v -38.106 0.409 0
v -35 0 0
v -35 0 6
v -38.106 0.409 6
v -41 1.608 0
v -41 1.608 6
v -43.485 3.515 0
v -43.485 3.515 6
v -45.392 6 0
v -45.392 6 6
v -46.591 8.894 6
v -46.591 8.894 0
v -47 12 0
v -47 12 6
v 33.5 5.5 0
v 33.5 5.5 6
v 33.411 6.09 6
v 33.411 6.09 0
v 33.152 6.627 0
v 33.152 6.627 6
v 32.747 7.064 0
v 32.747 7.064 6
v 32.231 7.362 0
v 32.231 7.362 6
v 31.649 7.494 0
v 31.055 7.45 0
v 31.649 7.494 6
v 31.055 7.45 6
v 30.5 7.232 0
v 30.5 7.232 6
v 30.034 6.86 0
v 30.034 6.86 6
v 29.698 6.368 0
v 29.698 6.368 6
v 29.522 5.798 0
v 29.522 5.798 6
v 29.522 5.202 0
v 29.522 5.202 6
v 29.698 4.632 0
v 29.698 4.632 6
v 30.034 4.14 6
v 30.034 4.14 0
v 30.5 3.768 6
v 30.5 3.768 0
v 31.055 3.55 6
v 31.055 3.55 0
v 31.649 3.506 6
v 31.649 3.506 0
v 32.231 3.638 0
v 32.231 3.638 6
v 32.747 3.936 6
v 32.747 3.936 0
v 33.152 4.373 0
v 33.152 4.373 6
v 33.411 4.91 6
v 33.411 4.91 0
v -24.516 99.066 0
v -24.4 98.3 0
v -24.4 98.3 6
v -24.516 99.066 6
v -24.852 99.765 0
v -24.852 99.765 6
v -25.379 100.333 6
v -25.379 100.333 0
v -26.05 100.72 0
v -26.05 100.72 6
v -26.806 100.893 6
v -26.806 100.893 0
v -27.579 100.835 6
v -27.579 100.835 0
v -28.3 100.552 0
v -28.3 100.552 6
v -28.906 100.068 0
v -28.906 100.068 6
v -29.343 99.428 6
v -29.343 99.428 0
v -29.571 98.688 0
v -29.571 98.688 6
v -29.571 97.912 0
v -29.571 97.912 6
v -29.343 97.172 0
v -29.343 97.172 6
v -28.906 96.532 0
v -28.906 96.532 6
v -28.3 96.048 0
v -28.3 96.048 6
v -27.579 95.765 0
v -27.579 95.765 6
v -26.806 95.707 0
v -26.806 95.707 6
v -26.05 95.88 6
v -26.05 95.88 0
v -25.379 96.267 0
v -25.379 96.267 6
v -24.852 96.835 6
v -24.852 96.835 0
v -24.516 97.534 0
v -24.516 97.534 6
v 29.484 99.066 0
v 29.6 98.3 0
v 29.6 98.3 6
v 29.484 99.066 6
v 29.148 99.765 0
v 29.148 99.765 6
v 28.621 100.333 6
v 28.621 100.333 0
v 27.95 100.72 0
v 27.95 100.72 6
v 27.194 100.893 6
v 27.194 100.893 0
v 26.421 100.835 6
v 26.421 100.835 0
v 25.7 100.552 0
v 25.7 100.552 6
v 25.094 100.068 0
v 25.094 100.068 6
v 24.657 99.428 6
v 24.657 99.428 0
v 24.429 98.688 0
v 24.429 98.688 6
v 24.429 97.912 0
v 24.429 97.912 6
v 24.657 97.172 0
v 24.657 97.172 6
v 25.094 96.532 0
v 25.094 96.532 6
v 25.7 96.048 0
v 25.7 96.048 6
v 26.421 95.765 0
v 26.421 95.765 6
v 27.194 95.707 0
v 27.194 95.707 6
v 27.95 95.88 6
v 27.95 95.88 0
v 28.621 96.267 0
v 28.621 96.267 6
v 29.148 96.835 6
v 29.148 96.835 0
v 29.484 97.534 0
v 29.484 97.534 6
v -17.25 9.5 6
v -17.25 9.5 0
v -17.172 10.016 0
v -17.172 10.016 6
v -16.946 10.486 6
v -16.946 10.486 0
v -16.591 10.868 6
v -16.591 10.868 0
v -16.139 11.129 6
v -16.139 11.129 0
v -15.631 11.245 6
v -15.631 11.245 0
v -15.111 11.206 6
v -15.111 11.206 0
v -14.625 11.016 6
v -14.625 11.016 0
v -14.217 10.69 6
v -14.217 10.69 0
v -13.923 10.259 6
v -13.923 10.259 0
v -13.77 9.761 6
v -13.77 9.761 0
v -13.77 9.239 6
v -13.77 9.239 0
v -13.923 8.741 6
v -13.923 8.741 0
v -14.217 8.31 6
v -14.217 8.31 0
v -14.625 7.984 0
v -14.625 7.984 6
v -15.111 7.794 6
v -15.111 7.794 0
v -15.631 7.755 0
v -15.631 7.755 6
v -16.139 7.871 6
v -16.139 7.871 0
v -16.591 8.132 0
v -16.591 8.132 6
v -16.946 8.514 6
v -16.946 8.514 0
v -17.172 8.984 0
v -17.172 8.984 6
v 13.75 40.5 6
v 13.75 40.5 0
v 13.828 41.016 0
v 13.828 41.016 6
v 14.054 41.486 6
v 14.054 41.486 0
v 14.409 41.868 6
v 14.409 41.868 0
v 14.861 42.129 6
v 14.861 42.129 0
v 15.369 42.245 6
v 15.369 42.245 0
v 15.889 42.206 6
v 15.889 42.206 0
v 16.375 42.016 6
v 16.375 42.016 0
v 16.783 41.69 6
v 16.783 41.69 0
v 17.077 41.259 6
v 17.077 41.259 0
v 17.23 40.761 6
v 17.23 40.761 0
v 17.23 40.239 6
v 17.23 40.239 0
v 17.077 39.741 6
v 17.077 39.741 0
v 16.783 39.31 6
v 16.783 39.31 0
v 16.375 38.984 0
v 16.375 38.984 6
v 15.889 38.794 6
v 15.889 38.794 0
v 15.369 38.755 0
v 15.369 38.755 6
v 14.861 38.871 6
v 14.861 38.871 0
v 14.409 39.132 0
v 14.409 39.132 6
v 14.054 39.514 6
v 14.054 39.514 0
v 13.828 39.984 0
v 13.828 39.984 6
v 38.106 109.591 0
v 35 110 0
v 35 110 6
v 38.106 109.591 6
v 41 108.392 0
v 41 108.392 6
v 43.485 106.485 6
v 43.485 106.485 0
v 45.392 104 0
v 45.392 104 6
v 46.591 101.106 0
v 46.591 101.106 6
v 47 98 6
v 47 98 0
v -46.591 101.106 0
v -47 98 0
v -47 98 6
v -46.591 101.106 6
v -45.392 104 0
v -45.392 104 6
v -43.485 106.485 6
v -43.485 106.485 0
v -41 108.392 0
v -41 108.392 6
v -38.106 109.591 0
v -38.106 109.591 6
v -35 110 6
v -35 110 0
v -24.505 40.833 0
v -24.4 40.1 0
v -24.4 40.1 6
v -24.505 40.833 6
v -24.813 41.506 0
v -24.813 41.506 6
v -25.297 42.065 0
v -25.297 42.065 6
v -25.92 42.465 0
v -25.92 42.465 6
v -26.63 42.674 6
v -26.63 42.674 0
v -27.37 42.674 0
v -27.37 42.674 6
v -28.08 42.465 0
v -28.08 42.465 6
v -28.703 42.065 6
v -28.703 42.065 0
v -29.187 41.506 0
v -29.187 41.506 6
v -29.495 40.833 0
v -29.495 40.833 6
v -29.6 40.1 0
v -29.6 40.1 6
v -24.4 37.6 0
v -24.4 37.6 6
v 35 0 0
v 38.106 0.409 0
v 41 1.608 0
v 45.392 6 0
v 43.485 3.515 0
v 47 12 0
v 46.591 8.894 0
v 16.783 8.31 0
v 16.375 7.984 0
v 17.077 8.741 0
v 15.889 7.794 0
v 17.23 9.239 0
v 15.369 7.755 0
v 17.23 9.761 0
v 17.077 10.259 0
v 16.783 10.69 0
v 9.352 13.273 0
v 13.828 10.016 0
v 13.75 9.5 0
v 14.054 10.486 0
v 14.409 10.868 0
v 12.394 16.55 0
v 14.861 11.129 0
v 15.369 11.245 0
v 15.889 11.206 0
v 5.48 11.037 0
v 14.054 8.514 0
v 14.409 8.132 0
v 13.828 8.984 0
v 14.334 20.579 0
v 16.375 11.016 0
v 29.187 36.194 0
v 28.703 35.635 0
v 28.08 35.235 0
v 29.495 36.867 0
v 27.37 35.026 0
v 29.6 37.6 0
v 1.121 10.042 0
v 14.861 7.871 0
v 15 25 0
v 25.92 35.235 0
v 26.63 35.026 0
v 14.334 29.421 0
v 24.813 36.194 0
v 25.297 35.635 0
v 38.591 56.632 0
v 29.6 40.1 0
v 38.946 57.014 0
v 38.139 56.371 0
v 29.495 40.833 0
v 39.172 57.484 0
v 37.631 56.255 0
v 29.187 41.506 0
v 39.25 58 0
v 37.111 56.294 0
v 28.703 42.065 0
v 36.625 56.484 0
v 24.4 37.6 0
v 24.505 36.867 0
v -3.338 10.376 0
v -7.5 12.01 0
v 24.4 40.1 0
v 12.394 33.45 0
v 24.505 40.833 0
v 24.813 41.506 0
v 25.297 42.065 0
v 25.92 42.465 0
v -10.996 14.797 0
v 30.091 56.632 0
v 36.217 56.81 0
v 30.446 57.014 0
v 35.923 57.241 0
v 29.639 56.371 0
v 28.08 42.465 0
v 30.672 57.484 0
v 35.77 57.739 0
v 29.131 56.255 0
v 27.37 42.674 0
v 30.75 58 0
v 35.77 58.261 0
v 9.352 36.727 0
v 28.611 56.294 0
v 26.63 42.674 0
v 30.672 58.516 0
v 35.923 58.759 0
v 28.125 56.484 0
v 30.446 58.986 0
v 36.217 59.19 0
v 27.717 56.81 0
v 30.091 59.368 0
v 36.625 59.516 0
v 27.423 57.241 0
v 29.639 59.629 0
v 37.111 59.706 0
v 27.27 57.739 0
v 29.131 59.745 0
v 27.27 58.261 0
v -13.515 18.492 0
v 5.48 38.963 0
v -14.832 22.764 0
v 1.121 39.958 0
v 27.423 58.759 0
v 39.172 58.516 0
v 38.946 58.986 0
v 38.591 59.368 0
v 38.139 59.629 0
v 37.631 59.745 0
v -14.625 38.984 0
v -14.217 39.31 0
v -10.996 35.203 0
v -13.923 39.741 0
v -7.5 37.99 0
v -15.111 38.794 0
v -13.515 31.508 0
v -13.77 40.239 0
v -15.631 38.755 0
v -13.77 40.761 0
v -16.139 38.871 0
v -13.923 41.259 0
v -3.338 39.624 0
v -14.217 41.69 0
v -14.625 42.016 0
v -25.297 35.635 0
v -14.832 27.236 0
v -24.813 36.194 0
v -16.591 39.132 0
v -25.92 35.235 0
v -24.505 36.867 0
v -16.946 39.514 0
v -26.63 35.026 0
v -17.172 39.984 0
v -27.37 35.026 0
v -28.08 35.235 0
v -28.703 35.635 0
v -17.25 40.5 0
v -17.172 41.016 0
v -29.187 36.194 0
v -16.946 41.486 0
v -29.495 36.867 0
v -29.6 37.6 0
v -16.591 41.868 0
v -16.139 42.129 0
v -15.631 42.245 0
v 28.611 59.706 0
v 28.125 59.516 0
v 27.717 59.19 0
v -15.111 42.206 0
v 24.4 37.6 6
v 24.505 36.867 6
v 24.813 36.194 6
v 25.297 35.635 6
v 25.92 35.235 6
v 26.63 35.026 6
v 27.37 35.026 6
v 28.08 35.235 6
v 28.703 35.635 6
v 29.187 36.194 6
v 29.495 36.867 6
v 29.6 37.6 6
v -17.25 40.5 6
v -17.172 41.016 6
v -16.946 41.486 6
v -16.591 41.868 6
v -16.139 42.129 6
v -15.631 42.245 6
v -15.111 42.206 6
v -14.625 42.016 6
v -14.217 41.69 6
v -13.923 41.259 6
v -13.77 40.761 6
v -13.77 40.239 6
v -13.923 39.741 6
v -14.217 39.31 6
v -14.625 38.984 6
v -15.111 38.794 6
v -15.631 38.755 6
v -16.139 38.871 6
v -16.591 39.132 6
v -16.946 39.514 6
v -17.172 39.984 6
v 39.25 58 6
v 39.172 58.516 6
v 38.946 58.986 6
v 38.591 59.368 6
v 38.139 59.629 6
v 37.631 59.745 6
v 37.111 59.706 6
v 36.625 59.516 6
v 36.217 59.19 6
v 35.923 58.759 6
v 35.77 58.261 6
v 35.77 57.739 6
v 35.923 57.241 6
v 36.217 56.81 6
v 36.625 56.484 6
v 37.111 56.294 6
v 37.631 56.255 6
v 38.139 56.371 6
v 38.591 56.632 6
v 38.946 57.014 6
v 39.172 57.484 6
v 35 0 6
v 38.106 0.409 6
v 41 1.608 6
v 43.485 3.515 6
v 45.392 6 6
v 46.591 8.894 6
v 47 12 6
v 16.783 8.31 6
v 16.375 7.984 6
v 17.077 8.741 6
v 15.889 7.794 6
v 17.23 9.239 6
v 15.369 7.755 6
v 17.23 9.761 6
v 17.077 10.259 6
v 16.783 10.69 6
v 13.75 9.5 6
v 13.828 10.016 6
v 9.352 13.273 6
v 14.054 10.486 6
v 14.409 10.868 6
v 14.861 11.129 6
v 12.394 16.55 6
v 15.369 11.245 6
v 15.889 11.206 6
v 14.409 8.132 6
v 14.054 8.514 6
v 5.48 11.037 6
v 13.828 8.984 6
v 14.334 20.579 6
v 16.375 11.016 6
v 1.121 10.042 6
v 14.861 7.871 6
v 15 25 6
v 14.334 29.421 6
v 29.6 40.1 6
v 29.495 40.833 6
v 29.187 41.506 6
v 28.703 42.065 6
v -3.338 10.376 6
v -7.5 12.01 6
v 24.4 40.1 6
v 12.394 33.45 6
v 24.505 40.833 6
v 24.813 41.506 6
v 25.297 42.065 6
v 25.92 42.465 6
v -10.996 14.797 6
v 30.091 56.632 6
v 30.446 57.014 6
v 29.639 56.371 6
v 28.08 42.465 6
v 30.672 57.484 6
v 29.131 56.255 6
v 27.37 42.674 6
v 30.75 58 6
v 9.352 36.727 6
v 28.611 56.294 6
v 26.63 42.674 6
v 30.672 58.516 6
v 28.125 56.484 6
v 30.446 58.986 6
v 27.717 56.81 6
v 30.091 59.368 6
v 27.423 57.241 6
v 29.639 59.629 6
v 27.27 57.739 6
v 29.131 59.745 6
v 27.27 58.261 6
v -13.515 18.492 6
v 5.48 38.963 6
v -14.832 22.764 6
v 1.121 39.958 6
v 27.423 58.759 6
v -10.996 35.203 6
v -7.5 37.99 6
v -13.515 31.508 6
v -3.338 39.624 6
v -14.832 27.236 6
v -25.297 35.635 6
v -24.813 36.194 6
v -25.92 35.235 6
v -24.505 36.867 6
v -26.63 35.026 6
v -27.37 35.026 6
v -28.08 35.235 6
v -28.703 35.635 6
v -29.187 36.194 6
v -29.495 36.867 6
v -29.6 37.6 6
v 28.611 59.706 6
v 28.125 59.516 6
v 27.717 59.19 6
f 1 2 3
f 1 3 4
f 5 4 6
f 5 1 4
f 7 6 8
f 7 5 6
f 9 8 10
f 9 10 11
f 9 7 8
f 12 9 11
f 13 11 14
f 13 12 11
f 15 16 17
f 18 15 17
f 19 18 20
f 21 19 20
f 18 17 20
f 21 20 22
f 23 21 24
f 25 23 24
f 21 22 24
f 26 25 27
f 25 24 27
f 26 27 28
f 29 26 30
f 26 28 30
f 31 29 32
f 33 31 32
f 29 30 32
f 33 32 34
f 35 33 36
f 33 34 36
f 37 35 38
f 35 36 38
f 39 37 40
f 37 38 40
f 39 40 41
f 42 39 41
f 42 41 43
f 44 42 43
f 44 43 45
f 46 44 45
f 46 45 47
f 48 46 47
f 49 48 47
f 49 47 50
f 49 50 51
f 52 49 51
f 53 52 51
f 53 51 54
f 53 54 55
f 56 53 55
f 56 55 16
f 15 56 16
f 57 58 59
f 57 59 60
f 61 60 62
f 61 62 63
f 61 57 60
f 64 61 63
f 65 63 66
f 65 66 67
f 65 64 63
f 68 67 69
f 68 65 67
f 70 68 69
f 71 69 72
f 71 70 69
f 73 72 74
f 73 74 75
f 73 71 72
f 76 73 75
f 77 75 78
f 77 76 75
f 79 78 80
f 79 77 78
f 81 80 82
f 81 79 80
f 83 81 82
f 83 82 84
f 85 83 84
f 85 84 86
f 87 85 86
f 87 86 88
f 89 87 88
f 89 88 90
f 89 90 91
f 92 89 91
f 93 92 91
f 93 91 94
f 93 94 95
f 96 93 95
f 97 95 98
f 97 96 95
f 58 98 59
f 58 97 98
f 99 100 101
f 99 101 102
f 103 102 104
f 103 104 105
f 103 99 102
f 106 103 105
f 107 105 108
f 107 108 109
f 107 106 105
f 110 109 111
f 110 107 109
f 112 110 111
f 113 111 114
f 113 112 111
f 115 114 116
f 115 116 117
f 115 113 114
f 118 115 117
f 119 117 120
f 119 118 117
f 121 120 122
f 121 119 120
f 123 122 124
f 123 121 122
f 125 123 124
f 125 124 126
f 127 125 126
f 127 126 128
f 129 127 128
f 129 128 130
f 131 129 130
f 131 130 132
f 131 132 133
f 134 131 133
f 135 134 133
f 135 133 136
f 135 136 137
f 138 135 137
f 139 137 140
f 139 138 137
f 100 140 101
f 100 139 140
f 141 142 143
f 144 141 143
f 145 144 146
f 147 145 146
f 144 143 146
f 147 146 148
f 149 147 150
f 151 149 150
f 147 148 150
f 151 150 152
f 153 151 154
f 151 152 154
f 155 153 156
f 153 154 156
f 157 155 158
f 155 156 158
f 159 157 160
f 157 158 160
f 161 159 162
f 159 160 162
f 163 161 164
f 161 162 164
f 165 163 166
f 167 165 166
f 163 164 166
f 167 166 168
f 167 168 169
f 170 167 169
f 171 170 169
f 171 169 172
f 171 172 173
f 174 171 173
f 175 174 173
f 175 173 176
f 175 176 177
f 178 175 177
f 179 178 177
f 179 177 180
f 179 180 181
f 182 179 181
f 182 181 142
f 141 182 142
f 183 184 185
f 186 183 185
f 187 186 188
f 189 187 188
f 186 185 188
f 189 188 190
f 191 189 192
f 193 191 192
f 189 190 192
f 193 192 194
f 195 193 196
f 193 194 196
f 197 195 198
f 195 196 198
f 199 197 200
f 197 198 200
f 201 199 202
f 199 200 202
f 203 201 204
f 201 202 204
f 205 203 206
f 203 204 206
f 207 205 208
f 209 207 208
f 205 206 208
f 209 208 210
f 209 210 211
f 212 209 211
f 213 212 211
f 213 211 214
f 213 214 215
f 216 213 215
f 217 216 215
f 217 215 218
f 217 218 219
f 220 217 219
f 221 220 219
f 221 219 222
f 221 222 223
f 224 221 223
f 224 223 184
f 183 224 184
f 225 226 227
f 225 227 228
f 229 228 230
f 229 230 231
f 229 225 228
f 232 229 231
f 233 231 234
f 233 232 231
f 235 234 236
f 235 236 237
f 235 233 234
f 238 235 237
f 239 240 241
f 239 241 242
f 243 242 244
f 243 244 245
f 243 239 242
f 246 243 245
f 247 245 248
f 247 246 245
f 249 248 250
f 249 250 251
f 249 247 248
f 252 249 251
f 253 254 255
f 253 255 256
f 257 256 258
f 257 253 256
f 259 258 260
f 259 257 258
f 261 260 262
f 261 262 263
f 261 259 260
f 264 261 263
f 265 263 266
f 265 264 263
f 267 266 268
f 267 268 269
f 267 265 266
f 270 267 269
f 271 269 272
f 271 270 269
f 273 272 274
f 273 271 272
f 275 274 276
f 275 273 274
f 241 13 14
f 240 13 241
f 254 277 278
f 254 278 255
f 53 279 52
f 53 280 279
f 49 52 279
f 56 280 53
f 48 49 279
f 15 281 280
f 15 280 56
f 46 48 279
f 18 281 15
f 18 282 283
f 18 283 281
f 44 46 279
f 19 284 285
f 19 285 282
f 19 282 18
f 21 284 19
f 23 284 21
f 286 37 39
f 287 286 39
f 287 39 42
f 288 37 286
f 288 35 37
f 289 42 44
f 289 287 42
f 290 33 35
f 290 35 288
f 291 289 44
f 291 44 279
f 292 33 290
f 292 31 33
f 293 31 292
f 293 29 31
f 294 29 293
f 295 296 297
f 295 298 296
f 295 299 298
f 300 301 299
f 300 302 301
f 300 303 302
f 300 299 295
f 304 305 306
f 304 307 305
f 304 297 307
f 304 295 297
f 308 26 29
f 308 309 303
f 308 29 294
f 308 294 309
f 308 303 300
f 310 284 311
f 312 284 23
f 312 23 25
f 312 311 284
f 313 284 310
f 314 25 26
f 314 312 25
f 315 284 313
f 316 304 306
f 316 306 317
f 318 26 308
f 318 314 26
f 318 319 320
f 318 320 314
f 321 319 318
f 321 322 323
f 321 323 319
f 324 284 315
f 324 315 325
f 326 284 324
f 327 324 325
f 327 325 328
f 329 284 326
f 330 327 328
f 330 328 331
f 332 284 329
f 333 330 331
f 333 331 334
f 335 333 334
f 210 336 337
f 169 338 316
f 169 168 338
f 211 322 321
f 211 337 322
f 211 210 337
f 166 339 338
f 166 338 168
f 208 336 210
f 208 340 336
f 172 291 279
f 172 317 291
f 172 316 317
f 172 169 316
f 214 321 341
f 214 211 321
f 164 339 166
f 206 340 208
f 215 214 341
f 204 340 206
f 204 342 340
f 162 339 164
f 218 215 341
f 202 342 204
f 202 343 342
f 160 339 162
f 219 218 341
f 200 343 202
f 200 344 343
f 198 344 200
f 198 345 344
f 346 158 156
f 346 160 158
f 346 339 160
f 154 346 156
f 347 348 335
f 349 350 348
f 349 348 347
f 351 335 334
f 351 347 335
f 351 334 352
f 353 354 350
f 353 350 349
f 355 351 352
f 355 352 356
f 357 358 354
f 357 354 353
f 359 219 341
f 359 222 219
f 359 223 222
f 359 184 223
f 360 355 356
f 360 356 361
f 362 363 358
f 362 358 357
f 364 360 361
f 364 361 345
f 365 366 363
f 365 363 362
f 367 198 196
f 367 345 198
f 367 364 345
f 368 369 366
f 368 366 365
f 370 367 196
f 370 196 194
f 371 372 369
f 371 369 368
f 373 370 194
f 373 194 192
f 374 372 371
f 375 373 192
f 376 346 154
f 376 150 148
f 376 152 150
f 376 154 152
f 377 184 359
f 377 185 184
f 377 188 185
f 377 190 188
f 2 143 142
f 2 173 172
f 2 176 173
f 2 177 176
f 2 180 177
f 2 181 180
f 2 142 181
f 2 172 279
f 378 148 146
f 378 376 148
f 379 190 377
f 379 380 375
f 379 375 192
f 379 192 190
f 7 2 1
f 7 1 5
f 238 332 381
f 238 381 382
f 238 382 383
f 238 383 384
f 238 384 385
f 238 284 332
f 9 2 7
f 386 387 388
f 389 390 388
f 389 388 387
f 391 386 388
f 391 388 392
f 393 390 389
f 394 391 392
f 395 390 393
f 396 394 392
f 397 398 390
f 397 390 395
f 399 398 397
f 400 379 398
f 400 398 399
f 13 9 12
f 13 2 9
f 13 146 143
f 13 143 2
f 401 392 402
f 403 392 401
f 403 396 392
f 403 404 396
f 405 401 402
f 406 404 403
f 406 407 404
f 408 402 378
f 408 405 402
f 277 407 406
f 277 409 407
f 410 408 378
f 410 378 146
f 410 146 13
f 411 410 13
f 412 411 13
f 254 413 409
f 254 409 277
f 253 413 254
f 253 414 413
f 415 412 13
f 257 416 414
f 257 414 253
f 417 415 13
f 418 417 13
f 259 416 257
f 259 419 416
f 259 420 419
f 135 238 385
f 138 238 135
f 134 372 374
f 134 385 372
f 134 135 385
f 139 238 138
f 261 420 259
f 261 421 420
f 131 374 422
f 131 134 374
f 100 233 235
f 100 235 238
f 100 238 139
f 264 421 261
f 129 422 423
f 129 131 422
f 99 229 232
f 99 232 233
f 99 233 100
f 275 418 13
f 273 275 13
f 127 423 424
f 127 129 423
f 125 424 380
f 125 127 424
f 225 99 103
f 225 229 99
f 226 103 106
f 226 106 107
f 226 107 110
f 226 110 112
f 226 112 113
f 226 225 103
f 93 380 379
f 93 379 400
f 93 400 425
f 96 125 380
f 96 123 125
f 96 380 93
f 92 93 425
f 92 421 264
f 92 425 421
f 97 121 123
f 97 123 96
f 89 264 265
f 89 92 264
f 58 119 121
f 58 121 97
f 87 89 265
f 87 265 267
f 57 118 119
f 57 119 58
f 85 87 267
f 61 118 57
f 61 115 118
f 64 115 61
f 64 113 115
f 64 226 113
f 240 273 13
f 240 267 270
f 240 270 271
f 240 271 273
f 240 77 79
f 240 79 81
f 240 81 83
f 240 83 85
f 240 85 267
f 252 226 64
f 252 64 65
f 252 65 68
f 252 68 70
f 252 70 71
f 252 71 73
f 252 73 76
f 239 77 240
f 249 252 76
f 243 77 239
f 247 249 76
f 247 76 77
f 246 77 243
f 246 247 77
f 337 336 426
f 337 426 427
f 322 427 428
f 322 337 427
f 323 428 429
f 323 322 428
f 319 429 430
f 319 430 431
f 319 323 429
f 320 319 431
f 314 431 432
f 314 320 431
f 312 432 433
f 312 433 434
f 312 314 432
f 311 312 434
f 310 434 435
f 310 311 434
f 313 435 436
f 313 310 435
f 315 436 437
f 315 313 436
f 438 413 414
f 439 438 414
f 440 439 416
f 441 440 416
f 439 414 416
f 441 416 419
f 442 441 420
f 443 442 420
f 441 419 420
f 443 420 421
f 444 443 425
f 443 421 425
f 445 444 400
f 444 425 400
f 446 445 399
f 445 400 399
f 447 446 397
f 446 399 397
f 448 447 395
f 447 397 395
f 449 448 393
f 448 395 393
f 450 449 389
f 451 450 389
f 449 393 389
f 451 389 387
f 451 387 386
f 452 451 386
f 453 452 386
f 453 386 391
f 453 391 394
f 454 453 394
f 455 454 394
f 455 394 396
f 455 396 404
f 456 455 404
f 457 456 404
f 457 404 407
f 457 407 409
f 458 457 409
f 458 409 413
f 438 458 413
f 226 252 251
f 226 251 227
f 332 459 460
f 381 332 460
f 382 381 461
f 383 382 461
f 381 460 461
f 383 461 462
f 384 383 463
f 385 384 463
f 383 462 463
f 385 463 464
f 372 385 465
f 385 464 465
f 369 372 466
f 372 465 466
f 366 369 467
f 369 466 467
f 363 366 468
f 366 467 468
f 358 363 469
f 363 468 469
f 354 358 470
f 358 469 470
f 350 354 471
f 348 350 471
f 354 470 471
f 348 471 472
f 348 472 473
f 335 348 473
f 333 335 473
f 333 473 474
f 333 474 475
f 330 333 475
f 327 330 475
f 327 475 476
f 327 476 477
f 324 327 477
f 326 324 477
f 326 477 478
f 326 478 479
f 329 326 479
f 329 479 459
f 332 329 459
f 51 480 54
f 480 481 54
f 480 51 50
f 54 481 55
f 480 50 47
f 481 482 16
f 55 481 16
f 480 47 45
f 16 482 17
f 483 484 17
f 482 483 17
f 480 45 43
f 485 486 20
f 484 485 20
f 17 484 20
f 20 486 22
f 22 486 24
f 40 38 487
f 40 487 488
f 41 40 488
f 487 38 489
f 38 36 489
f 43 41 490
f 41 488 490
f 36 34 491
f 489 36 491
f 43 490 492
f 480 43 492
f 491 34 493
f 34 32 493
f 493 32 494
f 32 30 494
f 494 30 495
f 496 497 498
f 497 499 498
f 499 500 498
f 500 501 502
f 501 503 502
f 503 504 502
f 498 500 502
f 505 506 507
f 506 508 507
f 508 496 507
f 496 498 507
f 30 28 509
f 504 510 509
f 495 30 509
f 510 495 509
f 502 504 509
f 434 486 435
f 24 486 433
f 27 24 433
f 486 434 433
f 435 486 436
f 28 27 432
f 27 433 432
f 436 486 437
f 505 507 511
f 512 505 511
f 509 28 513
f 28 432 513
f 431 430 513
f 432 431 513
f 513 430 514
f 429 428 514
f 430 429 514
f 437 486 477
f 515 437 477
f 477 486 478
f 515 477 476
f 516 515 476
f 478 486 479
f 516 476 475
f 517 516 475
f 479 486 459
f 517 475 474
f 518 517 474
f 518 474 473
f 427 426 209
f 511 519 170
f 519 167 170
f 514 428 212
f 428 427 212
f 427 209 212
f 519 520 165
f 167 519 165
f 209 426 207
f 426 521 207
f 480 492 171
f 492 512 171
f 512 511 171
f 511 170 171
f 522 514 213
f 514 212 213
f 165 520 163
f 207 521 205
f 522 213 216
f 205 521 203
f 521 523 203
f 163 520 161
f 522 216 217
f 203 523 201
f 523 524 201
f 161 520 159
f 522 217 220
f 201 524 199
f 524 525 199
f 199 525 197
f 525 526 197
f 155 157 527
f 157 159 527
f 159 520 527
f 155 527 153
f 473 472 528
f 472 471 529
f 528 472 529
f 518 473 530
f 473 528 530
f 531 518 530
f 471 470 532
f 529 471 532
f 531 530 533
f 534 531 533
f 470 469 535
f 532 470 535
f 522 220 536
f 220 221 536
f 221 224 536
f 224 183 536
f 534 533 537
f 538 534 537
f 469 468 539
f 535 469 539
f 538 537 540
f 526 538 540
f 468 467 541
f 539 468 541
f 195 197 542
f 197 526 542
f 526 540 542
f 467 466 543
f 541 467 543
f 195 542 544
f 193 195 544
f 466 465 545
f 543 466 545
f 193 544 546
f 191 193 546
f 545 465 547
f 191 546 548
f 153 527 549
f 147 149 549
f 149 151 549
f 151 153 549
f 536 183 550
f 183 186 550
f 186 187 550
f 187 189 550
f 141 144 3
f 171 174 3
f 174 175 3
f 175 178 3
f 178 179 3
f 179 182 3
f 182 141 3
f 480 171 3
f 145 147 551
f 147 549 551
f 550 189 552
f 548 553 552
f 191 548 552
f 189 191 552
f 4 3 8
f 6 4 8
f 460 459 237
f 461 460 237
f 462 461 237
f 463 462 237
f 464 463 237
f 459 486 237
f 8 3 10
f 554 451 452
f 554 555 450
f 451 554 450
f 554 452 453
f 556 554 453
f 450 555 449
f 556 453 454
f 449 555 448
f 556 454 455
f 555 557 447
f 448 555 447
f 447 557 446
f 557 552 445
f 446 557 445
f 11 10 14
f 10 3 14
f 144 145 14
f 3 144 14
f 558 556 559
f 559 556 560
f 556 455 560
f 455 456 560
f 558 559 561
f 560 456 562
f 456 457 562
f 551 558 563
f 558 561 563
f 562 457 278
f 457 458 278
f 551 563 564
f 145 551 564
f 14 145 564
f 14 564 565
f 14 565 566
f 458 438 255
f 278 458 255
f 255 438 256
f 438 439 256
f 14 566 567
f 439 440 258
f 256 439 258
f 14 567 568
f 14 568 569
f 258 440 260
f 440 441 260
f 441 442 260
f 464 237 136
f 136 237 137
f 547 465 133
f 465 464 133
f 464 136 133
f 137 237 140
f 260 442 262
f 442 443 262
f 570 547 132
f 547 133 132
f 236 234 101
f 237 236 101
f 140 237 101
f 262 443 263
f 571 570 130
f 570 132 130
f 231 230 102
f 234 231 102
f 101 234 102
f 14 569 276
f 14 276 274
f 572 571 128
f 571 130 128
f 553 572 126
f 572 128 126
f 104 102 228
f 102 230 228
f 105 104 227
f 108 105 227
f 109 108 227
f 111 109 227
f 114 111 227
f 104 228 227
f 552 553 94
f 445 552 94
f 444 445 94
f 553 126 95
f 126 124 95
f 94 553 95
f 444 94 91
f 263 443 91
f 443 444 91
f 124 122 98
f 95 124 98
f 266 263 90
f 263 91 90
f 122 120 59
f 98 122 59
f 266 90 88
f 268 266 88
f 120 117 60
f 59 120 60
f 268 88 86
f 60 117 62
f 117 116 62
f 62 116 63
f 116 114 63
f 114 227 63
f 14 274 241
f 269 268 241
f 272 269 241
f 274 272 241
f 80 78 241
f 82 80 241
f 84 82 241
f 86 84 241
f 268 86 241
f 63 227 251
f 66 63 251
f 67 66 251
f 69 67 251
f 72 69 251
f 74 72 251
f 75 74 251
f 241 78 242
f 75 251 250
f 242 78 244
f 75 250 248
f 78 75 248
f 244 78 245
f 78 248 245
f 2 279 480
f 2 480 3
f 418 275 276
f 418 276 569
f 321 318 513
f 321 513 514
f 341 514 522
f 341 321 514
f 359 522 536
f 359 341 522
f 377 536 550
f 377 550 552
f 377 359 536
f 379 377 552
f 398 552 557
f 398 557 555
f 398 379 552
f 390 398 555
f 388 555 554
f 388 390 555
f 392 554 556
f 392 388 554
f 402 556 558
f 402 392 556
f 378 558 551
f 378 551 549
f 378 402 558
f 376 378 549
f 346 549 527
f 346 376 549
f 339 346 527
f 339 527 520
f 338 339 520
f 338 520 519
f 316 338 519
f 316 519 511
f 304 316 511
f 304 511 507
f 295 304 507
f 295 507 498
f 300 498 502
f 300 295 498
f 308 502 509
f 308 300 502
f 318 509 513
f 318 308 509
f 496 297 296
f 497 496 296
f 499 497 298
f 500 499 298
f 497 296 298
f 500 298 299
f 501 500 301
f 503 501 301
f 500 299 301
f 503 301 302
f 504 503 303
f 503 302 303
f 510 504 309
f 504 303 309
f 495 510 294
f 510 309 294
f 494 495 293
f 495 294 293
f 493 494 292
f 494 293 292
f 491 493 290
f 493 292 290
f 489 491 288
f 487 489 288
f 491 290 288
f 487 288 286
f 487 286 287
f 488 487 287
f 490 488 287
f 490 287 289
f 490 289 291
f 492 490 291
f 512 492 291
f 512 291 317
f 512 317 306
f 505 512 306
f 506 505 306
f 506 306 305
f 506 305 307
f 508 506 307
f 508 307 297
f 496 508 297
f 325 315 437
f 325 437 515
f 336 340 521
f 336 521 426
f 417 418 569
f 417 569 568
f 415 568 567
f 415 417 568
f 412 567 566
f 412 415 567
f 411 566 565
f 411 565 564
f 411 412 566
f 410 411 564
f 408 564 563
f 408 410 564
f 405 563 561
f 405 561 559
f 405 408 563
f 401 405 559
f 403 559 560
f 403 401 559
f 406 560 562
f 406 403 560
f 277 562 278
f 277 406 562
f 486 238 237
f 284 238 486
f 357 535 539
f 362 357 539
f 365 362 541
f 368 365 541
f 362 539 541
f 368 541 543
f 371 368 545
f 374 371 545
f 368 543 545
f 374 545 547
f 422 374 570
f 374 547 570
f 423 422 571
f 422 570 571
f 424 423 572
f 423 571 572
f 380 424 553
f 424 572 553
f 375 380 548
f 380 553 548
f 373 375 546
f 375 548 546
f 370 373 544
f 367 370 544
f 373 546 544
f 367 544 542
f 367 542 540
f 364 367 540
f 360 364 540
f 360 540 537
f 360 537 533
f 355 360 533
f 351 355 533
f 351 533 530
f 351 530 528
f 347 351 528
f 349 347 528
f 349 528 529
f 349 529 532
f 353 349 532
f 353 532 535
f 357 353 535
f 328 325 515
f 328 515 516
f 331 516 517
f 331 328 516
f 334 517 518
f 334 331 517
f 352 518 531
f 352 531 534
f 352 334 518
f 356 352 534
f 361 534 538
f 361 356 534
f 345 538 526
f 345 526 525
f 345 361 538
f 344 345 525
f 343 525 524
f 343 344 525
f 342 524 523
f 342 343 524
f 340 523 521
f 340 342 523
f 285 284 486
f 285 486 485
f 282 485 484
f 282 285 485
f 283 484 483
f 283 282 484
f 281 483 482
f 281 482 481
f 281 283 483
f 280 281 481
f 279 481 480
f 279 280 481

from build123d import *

# Parameters (mm, degrees)
MODEL_R                     = 15
MODEL_R_2                   = 2.6
BASE_DEPTH                  = 6
SKETCH2_R                   = 2
CABLETIEMOUNT_DEPTH         = 7
F_3_5_3_5_STEPPERMOUNT_D    = 3.5
F_3_5_3_5_CABLECHAINMOUNT_D = 3.5


with BuildPart() as part:
    # Model → Base (new body)
    with BuildSketch(Plane.XY):
        with BuildLine():
            Line((47, 98), (47, 12))
            ThreePointArc((47, 12), (43.485281374, 3.514718626), (35, 0))
            Line((35, 0), (-35, 0))
            ThreePointArc((-35, 0), (-43.485281374, 3.514718626), (-47, 12))
            Line((-47, 12), (-47, 98))
            ThreePointArc((-47, 98), (-43.485281374, 106.485281374), (-35, 110))
            Line((-35, 110), (35, 110))
            ThreePointArc((35, 110), (43.485281374, 106.485281374), (47, 98))
        make_face()
        with Locations((0, 25)):
            Circle(MODEL_R, mode=Mode.SUBTRACT)
        with Locations((27, 98.3)):
            Circle(MODEL_R_2, mode=Mode.SUBTRACT)
        with Locations((-27, 98.3)):
            Circle(MODEL_R_2, mode=Mode.SUBTRACT)
        with BuildLine():
            Line((-29.6, 40.1), (-29.6, 37.6))
            ThreePointArc((-29.6, 37.6), (-27, 35), (-24.4, 37.6))
            Line((-24.4, 37.6), (-24.4, 40.1))
            ThreePointArc((-24.4, 40.1), (-27, 42.7), (-29.6, 40.1))
        make_face(mode=Mode.SUBTRACT)
        with BuildLine():
            Line((29.6, 37.6), (29.6, 40.1))
            ThreePointArc((29.6, 40.1), (27, 42.7), (24.4, 40.1))
            Line((24.4, 40.1), (24.4, 37.6))
            ThreePointArc((24.4, 37.6), (27, 35), (29.6, 37.6))
        make_face(mode=Mode.SUBTRACT)
    extrude(amount=BASE_DEPTH)

    # Sketch2 → CableTieMount (cut, through all)
    with BuildSketch(Plane.XY.offset(6)):
        with Locations((31.5, 5.5)):
            Circle(SKETCH2_R)
    extrude(amount=-CABLETIEMOUNT_DEPTH, mode=Mode.SUBTRACT)

    # Ø3.5 (3.5) StepperMount (through all)
    with Locations(Plane.XY.offset(6)):
        with Locations((-15.5, 40.5), (-15.5, 9.5), (15.5, 9.5), (15.5, 40.5)):
            Hole(F_3_5_3_5_STEPPERMOUNT_D / 2)

    # Ø3.5 (3.5) CableChainMount (through all)
    with Locations(Plane(origin=(0, 0, 0), x_dir=(-1, 0, 0), z_dir=(0, 0, -1))):
        with Locations((-37.5, 58), (-29, 58)):
            Hole(F_3_5_3_5_CABLECHAINMOUNT_D / 2)


solid = part.part
